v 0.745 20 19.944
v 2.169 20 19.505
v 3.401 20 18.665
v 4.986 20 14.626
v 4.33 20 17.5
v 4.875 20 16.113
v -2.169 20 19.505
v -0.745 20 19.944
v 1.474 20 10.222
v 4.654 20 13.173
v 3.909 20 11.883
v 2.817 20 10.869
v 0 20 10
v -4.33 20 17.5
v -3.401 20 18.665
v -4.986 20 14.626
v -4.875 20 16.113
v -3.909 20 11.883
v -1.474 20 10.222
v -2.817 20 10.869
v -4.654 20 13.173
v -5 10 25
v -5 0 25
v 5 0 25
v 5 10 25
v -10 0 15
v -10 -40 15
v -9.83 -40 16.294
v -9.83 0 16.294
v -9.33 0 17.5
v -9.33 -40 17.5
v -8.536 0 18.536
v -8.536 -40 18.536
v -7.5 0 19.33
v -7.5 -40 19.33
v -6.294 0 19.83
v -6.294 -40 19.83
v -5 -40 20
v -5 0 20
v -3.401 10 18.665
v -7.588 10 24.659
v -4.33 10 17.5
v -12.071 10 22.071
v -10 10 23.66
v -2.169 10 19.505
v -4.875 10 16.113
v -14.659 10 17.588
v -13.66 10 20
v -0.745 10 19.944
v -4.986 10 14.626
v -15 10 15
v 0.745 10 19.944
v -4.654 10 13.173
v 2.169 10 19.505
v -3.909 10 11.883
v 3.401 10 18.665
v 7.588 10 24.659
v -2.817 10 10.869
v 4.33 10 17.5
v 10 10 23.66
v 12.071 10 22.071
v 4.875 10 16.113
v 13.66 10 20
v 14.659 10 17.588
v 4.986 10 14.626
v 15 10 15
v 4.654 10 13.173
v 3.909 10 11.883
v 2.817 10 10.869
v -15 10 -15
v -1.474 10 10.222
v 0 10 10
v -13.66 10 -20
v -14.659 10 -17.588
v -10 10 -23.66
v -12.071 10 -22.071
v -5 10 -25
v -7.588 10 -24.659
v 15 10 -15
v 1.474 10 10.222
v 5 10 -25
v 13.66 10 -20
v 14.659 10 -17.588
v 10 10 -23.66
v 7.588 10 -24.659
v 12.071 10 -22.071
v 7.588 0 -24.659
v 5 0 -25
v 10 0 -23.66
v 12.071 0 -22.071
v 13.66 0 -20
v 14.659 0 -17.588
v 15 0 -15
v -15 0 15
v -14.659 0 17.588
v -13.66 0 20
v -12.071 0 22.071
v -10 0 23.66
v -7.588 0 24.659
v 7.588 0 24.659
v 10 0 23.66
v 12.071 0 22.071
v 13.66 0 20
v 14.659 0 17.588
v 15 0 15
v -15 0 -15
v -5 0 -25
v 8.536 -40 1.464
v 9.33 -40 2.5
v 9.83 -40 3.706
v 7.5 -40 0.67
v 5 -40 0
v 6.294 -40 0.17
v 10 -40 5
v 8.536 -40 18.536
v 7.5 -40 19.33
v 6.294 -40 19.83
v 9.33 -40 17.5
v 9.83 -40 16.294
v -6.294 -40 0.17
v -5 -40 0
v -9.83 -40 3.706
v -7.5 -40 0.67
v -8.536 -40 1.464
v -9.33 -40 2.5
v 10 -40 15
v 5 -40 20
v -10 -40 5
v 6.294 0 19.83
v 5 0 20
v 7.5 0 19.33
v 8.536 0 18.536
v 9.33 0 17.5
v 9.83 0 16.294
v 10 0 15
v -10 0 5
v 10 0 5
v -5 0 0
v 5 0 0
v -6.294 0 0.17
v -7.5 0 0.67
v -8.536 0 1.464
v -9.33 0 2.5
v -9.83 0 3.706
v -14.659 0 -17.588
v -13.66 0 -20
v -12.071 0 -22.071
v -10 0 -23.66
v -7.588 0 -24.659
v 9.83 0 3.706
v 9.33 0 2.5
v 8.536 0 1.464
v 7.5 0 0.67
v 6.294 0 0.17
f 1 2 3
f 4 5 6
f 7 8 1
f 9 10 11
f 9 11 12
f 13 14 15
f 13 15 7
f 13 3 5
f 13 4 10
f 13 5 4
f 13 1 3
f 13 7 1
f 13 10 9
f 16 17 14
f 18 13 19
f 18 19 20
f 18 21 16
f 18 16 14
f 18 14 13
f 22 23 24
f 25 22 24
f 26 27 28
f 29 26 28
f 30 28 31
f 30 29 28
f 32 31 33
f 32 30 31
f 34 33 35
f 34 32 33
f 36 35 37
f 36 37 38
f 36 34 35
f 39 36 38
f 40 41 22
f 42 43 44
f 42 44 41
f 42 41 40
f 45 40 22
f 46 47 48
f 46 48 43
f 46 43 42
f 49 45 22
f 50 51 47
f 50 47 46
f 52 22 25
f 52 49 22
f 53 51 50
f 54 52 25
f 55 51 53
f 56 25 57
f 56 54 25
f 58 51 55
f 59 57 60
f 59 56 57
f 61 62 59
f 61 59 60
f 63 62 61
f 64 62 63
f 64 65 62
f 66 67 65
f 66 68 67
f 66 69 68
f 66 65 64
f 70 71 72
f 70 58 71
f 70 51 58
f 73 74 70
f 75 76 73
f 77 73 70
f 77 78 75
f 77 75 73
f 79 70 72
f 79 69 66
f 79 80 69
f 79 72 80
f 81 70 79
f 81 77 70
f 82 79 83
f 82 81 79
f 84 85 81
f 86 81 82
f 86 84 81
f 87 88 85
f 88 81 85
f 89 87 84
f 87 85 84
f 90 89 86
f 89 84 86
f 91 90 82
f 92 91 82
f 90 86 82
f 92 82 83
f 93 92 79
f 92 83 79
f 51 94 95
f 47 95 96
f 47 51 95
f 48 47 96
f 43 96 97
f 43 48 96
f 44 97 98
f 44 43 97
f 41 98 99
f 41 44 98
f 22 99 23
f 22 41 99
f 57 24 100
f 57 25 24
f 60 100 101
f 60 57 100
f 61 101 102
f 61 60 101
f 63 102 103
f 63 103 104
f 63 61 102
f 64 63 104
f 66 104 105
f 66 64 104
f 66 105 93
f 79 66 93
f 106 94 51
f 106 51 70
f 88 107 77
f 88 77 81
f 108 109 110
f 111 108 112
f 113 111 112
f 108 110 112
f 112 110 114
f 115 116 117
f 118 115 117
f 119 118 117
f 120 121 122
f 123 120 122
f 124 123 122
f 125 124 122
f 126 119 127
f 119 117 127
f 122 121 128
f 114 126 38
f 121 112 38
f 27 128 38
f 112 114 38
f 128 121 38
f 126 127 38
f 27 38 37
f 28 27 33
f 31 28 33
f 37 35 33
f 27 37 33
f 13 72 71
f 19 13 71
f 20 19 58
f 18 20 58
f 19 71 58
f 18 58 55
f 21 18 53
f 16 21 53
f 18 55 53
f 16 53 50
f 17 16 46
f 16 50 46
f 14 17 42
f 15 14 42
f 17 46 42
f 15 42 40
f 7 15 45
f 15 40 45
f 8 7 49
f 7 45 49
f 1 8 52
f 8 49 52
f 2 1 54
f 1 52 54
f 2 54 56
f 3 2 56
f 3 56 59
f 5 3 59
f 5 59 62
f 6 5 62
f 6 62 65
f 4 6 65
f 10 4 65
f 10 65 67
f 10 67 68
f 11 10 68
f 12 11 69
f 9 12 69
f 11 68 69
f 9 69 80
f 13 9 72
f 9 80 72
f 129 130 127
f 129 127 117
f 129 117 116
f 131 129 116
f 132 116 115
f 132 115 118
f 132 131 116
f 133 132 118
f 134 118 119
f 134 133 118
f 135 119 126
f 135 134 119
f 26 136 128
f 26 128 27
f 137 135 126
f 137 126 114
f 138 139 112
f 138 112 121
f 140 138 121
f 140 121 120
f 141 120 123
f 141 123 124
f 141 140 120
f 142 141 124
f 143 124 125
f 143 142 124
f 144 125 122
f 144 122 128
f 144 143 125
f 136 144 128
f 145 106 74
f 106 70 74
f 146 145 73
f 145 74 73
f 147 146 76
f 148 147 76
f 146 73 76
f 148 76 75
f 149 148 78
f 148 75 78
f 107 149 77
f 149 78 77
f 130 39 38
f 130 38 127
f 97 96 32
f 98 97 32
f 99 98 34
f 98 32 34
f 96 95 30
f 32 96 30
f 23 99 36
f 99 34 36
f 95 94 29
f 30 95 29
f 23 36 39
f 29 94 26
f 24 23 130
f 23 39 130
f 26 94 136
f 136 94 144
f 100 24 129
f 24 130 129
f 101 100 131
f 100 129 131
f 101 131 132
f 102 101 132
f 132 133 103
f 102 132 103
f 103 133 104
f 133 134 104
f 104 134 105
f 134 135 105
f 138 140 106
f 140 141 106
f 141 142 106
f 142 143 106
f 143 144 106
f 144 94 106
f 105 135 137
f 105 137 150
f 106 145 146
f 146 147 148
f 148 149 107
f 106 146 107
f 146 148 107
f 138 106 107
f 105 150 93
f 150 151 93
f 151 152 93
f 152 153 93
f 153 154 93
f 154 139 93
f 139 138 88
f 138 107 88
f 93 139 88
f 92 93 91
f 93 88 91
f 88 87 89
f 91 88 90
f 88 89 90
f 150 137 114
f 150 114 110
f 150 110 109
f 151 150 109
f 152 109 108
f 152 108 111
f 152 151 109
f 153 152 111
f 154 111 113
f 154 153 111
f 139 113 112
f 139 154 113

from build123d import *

# Parameters (mm, degrees)
SKETCH1_W           = 30
SKETCH1_H           = 50
BOSS_EXTRUDE1_DEPTH = 10
SKETCH2_R           = 5
BOSS_EXTRUDE2_DEPTH = 10
FILLET1_R           = 10
FILLET2_R           = 10
BOSS_EXTRUDE3_DEPTH = 40


with BuildPart() as part:
    # Sketch1 → Boss-Extrude1 (new body)
    with BuildSketch(Plane(origin=(0, 0, 0), x_dir=(1, 0, 0), z_dir=(0, 1, 0))):
        Rectangle(SKETCH1_W, SKETCH1_H)
    extrude(amount=BOSS_EXTRUDE1_DEPTH)

    # Sketch2 → Boss-Extrude2 (add)
    with BuildSketch(Plane(origin=(0, 10, 0), x_dir=(1, 0, 0), z_dir=(0, 1, 0))):
        with Locations(Location((0, -15, 0), (0, 0, 90))):
            Circle(SKETCH2_R)
    extrude(amount=BOSS_EXTRUDE2_DEPTH)

    # Fillet1
    fillet1_edges = [part.edges().sort_by_distance(p)[0] for p in [
        (-15, 5, -25),
        (15, 5, -25),
    ]]
    fillet(fillet1_edges, radius=FILLET1_R)

    # Fillet2
    fillet2_edges = [part.edges().sort_by_distance(p)[0] for p in [
        (15, 5, 25),
        (-15, 5, 25),
    ]]
    fillet(fillet2_edges, radius=FILLET2_R)

    # Sketch3 → Boss-Extrude3 (add)
    with BuildSketch(Plane.XZ):
        with BuildLine():
            Line((10, 15), (10, 5))
            ThreePointArc((10, 5), (8.535533906, 1.464466094), (5, 0))
            Line((5, 0), (-5, 0))
            ThreePointArc((-5, 0), (-8.535533906, 1.464466094), (-10, 5))
            Line((-10, 5), (-10, 15))
            ThreePointArc((-10, 15), (-8.535533906, 18.535533906), (-5, 20))
            Line((-5, 20), (5, 20))
            ThreePointArc((5, 20), (8.535533906, 18.535533906), (10, 15))
        make_face()
    extrude(amount=BOSS_EXTRUDE3_DEPTH)


solid = part.part
